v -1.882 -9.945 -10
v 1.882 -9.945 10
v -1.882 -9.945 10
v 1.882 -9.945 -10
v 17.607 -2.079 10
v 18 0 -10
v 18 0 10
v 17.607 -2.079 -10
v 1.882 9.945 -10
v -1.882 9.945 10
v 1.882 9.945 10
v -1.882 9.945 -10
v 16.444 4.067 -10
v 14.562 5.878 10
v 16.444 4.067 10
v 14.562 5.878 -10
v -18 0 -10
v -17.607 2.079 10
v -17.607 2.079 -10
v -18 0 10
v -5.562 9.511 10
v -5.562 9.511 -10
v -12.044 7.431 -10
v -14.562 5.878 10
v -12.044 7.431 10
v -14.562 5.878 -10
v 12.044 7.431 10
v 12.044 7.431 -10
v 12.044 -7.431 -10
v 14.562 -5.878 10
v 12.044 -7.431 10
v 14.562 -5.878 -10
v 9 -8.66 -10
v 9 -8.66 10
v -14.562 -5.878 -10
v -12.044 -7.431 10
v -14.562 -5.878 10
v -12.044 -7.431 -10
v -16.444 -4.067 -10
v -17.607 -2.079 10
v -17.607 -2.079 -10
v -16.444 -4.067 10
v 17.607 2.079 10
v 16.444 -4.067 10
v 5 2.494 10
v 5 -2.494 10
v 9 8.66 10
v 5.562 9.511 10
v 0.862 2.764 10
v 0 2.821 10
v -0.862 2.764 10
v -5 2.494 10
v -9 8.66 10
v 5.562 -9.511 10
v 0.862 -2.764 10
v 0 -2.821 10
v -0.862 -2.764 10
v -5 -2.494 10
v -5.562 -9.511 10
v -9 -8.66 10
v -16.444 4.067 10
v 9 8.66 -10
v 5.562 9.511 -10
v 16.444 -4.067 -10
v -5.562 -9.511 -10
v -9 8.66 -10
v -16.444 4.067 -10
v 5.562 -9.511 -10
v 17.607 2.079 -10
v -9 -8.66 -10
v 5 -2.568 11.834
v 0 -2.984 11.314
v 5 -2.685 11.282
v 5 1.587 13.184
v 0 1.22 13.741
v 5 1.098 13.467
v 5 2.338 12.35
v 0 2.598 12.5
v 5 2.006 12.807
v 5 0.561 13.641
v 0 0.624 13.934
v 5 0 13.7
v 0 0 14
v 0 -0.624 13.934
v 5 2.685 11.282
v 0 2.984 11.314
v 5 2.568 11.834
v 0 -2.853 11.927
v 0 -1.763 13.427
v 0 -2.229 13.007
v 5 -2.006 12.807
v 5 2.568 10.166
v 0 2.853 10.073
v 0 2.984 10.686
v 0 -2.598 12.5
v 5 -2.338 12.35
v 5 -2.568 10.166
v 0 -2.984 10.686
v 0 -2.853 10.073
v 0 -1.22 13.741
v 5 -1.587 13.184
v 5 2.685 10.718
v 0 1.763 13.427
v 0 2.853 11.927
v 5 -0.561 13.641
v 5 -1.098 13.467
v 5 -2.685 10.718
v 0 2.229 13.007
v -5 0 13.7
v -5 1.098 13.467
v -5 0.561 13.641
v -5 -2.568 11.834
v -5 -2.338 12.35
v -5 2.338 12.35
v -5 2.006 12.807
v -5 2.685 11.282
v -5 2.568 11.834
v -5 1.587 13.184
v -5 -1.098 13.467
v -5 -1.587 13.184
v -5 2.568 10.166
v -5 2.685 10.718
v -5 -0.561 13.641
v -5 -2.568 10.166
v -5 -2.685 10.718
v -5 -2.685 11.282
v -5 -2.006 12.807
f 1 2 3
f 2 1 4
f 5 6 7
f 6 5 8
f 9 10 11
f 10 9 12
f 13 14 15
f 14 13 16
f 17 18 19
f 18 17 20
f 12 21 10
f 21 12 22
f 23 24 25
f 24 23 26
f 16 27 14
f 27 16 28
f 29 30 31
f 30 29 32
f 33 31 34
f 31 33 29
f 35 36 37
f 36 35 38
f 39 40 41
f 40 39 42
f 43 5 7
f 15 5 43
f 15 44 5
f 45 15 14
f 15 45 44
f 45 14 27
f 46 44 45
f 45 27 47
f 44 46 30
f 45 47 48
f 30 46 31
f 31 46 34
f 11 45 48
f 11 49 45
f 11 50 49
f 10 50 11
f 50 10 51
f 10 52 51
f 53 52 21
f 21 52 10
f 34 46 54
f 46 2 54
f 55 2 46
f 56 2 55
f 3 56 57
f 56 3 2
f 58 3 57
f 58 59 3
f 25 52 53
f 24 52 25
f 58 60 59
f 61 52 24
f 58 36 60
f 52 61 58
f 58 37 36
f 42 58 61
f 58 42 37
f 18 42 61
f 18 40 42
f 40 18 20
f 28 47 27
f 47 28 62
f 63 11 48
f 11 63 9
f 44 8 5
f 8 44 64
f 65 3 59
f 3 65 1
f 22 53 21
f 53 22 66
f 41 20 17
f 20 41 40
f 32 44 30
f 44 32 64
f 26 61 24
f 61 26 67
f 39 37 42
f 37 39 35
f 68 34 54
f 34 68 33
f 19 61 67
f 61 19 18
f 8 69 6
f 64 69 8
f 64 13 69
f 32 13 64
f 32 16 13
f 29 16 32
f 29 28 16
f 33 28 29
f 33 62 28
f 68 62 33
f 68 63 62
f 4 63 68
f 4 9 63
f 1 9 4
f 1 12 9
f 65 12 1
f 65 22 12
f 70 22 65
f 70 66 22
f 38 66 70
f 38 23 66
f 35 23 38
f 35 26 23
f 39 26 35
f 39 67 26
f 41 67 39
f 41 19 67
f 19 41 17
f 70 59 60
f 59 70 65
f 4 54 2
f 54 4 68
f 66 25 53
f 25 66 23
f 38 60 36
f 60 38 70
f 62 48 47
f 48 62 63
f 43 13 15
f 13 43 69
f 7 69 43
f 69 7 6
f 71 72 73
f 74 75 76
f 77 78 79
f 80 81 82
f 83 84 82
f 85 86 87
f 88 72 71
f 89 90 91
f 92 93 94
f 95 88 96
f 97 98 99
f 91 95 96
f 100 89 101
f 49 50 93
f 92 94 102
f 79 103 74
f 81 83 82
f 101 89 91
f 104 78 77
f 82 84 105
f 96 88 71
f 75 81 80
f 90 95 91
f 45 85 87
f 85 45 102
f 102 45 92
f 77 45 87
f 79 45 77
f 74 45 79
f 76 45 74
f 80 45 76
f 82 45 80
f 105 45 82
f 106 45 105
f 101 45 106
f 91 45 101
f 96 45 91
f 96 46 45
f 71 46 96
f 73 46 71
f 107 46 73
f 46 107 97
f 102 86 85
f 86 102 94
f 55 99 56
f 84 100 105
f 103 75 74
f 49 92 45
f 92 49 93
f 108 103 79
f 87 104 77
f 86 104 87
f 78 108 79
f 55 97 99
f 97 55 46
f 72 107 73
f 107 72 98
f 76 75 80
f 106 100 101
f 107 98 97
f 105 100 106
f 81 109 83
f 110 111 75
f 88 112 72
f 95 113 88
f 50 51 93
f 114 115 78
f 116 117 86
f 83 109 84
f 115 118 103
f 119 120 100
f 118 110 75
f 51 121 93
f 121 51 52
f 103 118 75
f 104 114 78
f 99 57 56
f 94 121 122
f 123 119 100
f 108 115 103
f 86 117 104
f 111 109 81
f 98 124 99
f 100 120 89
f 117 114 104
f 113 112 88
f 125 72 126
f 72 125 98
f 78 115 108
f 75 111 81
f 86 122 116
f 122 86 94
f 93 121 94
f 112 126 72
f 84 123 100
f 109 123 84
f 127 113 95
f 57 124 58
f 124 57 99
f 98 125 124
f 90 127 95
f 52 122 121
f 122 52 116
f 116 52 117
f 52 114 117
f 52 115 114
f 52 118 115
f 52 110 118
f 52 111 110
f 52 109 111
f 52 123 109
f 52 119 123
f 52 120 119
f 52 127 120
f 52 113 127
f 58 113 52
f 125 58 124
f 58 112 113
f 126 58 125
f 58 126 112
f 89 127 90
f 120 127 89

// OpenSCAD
module Mallet(){

    color("#cdaa7d"){
    linear_extrude(20, center =true){
    scale([1.8,1,1])
    circle(r=10, $fn=30);
        }
    }
   
    color("#777777"){
    translate([0,0,11])
    rotate([0,90,0])
    cylinder(5,3,2.7, $fn = 30);
    }

    color("#777777"){
    translate([0,0,11])
    rotate([0,-90,0])
    cylinder(5,3,2.7, $fn = 30);
    }

}

Mallet();

// Written by Nicolì Angelo (Gengio) 2024: 
// MIT License

//Permission is hereby granted, free of charge, to any person obtaining a copy of this software and associated documentation files (the "Software"), to deal in the Software without restriction, including without limitation the rights to use, copy, modify, merge, publish, distribute, sublicense, and/or sell copies of the Software, and to permit persons to whom the Software is furnished to do so, subject to the following conditions:

//The above copyright notice and this permission notice shall be included in all copies or substantial portions of the Software.

//THE SOFTWARE IS PROVIDED "AS IS", WITHOUT WARRANTY OF ANY KIND, EXPRESS OR IMPLIED, INCLUDING BUT NOT LIMITED TO THE WARRANTIES OF MERCHANTABILITY, FITNESS FOR A PARTICULAR PURPOSE AND NONINFRINGEMENT. IN NO EVENT SHALL THE AUTHORS OR COPYRIGHT HOLDERS BE LIABLE FOR ANY CLAIM, DAMAGES OR OTHER LIABILITY, WHETHER IN AN ACTION OF CONTRACT, TORT OR OTHERWISE, ARISING FROM, OUT OF OR IN CONNECTION WITH THE SOFTWARE OR THE USE OR OTHER DEALINGS IN THE SOFTWARE.
